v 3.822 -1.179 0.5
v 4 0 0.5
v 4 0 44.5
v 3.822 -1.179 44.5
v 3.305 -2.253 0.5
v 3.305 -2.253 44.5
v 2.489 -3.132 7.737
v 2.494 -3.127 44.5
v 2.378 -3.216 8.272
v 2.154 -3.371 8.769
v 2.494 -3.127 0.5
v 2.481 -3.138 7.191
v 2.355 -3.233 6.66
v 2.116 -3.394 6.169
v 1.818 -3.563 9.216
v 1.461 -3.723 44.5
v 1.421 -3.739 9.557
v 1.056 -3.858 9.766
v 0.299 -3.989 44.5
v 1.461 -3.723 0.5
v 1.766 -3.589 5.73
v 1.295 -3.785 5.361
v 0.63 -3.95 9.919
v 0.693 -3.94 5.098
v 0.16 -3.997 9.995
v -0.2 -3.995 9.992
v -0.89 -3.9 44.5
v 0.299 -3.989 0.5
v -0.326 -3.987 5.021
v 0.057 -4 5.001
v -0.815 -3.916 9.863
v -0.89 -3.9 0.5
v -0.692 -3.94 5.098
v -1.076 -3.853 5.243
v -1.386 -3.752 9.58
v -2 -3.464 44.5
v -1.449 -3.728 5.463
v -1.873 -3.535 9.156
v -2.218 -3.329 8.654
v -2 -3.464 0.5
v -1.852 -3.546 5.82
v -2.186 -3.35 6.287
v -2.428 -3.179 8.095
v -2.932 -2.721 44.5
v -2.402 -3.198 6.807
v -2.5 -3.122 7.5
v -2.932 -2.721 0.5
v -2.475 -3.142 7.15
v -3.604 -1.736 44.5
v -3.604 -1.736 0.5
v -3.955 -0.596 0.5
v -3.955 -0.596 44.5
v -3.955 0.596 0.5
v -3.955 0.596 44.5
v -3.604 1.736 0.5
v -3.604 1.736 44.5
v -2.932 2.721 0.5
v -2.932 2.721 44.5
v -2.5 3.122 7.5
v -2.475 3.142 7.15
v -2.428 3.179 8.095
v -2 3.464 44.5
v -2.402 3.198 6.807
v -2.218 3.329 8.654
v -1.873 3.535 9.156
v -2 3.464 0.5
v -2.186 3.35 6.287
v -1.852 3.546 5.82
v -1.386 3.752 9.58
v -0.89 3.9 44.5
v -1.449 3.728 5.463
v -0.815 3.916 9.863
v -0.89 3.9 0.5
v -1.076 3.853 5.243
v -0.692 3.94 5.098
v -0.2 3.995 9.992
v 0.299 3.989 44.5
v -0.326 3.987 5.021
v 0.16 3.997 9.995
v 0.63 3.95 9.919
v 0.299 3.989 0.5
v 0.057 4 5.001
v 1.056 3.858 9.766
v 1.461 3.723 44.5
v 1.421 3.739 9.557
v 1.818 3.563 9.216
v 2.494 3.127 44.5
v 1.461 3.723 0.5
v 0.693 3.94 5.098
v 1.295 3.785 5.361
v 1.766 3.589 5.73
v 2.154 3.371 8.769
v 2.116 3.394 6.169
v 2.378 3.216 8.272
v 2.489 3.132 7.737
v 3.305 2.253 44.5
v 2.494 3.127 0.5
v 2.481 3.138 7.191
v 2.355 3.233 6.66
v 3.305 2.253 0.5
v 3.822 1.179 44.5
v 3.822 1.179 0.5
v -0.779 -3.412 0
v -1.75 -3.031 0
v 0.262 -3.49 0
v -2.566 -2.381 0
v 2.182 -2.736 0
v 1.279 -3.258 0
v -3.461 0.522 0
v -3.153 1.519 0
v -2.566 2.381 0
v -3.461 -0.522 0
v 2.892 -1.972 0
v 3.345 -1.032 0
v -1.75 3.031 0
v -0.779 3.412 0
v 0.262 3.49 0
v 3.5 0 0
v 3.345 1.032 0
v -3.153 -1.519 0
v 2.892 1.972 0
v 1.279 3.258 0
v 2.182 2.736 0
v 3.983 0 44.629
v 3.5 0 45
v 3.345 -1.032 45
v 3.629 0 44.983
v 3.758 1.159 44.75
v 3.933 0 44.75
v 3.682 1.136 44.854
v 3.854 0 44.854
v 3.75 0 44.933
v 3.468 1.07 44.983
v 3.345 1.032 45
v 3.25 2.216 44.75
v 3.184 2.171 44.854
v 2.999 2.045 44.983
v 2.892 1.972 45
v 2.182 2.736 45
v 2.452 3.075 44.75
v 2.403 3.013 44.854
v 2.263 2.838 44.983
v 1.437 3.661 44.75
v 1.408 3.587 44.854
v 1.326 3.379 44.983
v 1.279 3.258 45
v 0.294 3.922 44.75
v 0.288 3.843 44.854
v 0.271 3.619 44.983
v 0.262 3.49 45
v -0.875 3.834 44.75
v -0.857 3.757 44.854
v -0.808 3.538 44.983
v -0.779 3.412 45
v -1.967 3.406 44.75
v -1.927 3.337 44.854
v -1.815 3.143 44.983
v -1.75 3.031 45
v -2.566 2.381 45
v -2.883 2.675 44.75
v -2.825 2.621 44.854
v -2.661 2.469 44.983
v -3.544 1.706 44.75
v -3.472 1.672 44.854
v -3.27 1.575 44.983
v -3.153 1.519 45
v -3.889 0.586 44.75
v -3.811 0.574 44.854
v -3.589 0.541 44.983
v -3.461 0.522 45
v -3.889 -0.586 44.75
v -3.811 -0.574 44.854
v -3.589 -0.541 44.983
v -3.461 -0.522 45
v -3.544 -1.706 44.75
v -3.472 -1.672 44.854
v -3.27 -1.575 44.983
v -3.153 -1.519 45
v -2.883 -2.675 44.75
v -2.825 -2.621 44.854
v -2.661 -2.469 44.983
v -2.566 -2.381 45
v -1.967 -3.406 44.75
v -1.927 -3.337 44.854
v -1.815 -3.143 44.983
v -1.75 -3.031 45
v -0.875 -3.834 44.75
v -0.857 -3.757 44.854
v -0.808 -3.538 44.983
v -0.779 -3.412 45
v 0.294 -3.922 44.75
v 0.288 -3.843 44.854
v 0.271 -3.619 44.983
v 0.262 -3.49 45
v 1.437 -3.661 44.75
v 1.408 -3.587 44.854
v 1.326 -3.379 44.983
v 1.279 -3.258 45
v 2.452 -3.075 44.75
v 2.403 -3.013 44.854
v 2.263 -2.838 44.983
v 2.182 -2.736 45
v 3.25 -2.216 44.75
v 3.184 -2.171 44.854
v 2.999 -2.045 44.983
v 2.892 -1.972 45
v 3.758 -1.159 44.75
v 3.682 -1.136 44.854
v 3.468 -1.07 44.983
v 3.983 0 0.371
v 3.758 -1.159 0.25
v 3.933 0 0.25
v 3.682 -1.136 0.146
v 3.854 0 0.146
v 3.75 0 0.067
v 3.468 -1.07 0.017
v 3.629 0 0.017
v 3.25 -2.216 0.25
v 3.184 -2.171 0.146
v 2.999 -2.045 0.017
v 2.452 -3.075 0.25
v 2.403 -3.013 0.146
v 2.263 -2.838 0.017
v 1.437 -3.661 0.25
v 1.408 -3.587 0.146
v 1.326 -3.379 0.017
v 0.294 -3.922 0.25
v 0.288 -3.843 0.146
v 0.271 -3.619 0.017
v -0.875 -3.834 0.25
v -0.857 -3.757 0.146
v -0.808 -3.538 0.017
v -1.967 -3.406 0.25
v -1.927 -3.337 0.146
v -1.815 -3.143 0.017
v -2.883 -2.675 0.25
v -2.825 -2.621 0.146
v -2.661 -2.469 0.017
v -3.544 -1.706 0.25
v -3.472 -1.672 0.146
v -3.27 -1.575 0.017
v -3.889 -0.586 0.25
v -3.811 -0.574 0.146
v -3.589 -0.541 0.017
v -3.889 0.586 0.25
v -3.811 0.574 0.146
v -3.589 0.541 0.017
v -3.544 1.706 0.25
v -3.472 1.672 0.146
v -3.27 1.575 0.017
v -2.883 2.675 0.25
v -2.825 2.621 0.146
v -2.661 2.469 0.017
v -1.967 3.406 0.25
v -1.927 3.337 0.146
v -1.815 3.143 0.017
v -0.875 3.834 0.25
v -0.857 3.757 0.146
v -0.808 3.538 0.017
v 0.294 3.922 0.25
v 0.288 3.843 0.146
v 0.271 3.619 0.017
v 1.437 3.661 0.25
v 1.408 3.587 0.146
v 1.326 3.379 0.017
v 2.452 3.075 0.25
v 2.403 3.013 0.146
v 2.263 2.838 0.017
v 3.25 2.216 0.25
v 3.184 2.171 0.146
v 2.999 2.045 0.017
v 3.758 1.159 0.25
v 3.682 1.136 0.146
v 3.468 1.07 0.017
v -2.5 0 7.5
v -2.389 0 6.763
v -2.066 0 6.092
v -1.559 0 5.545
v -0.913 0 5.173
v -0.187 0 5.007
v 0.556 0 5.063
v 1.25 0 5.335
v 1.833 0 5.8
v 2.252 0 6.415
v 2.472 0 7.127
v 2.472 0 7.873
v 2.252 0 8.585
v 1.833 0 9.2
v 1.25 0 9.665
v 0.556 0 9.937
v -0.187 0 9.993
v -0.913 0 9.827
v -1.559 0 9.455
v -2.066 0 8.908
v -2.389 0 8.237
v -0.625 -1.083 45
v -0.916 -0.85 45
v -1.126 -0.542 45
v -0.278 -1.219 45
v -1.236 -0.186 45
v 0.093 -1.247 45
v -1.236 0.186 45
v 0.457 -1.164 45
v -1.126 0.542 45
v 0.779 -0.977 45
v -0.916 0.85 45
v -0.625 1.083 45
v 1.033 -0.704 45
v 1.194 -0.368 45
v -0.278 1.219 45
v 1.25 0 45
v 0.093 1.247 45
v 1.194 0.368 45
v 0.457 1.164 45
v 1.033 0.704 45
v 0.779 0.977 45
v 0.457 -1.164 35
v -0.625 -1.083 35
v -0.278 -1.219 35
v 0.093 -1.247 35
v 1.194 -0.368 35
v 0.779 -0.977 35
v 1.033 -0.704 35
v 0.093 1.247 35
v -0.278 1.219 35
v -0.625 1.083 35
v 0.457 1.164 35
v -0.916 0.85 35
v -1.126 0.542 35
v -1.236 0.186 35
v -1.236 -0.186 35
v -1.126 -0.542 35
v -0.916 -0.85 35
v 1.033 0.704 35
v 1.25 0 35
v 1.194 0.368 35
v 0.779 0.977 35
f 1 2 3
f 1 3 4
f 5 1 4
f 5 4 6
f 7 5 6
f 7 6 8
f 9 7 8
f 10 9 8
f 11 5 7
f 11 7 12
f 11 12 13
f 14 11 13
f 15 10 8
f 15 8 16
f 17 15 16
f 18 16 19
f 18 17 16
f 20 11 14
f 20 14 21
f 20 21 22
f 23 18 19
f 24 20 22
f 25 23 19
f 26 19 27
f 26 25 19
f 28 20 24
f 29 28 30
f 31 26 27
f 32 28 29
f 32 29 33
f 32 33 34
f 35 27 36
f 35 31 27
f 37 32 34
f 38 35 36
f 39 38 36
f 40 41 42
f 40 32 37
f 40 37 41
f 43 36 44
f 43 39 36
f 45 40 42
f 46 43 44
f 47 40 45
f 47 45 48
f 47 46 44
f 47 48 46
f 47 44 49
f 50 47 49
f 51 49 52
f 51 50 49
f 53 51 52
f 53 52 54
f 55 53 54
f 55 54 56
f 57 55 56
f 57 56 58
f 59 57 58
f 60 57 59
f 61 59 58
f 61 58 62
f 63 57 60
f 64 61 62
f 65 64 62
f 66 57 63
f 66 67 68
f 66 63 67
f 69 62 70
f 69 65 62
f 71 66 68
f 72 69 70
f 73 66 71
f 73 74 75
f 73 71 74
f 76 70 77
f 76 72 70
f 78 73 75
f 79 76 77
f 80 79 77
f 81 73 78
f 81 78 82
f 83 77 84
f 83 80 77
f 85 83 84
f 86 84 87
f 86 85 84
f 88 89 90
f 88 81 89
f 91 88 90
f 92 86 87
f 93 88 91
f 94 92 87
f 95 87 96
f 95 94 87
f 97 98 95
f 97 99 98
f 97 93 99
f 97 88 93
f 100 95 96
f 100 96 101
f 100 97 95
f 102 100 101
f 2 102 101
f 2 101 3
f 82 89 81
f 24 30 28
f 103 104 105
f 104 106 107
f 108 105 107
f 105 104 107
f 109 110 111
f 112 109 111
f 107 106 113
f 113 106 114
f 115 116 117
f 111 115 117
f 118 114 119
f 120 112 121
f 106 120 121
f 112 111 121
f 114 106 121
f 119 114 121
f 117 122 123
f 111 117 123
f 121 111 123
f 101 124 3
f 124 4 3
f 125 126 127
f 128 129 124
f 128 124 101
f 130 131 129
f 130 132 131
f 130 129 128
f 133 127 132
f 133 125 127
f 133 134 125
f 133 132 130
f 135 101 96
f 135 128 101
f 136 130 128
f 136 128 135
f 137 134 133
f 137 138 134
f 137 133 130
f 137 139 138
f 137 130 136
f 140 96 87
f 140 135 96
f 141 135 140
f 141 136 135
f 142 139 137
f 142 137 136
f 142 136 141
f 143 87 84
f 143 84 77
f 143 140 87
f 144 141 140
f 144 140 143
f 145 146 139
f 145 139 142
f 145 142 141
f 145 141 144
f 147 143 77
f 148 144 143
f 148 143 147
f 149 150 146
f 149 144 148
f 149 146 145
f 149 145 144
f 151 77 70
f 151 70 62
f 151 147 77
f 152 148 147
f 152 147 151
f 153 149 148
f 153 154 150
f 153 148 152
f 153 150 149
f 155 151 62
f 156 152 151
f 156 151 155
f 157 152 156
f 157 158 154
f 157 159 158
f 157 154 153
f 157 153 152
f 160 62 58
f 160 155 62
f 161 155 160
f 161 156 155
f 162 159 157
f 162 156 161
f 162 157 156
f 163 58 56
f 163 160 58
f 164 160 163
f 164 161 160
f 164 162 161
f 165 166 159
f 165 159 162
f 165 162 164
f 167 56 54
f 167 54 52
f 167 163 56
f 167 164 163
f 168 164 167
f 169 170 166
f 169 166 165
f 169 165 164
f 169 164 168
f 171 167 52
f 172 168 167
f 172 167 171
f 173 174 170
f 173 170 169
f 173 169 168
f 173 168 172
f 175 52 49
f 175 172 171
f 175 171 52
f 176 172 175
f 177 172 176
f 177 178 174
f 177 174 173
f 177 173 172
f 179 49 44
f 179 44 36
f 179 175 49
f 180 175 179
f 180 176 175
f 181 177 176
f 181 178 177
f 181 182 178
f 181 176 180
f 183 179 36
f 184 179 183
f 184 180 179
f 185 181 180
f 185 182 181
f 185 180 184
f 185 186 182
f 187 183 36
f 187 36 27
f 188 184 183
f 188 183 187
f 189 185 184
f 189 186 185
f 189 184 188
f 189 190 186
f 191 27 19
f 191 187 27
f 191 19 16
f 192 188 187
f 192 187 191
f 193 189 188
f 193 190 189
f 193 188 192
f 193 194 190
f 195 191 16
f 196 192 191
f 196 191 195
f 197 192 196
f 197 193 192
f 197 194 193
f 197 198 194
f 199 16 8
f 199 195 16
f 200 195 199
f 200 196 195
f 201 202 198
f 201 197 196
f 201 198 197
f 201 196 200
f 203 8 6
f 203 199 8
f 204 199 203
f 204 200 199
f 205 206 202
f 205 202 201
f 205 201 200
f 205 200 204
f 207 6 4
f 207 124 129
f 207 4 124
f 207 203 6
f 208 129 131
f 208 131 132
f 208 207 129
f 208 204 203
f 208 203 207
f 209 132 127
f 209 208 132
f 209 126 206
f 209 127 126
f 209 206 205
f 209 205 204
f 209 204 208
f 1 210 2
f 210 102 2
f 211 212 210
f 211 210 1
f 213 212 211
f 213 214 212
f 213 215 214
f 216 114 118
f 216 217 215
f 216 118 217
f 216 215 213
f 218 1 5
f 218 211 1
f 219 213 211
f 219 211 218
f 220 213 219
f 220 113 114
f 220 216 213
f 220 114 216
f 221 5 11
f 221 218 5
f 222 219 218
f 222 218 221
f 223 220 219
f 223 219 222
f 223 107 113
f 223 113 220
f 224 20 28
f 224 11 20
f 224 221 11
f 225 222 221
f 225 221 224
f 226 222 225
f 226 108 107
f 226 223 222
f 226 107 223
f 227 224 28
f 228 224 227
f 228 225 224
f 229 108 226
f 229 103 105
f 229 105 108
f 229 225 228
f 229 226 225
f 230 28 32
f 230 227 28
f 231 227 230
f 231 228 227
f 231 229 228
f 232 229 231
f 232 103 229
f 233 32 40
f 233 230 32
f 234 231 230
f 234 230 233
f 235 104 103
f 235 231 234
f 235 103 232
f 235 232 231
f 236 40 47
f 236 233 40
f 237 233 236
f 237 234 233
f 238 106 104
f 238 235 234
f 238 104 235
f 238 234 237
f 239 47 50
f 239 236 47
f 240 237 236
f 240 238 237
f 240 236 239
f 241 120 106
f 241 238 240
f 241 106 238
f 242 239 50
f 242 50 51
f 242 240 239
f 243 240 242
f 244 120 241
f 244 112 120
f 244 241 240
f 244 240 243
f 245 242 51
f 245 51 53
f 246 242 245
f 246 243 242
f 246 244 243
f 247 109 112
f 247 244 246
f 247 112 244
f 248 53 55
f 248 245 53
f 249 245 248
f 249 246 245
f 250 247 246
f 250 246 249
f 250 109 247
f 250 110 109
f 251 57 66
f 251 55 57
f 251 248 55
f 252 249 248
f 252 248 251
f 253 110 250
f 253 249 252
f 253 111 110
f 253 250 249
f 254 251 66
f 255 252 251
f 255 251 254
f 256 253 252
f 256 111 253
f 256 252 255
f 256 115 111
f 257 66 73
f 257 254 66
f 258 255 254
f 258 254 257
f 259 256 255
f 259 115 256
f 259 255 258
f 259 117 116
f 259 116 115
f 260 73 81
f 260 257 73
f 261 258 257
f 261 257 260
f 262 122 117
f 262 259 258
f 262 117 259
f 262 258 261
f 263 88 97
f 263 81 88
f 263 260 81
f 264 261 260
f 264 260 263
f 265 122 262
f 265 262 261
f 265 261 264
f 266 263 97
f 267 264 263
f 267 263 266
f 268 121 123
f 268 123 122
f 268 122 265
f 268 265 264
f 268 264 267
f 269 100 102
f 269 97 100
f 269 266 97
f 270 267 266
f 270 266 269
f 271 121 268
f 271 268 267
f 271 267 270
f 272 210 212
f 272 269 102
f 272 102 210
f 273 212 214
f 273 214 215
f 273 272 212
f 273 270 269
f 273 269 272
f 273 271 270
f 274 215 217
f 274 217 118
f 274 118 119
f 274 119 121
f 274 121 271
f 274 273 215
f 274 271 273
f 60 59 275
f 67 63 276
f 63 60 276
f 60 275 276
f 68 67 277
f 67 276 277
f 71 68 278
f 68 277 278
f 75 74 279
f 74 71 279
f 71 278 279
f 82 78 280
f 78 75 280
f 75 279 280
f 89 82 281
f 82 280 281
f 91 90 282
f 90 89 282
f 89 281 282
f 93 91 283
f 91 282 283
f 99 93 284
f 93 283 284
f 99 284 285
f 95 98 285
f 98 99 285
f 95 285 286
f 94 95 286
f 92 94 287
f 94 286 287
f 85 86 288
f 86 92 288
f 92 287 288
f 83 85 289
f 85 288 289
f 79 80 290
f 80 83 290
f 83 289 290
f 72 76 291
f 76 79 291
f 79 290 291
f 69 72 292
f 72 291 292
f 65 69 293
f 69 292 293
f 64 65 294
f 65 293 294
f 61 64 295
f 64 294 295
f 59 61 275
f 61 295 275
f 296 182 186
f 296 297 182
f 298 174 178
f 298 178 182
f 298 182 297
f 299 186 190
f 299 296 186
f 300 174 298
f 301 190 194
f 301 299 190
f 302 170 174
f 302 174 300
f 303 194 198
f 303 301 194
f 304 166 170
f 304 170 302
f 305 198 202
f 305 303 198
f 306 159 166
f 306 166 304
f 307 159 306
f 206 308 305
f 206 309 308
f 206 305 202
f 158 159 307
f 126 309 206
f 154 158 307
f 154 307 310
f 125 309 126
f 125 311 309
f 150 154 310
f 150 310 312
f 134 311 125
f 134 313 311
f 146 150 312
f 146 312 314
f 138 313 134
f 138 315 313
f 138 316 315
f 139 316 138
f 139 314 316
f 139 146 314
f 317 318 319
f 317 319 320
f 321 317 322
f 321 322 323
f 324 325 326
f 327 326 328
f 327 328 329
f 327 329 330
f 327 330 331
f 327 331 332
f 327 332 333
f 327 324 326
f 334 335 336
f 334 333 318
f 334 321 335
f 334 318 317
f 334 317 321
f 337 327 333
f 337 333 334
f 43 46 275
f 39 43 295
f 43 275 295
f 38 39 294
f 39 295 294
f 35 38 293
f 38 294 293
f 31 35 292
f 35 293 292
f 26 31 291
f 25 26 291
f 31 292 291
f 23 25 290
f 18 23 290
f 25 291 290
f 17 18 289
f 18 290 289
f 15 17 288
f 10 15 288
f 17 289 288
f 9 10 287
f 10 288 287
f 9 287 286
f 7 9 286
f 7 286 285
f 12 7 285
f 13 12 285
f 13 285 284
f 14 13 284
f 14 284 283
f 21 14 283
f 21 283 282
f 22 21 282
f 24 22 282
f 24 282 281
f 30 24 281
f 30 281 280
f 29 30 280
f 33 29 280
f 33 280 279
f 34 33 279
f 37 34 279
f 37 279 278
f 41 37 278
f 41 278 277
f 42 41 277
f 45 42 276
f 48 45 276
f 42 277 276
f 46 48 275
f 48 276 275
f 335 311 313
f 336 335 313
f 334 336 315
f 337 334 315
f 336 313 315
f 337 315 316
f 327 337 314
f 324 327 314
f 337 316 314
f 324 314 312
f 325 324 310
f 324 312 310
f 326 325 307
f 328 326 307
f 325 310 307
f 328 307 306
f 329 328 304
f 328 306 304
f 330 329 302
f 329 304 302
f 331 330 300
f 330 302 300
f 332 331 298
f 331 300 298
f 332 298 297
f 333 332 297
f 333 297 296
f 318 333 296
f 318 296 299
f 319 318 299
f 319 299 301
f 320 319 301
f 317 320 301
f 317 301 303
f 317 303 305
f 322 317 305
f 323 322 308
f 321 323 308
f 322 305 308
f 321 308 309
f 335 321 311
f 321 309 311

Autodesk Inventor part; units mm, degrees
ref_plane "YZ Plane" through (0, 0, 0) normal (1, 0, 0) x (0, 1, 0)
ref_plane "XZ Plane" through (0, 0, 0) normal (0, 1, 0) x (-1, 0, 0)
ref_plane "XY Plane" through (0, 0, 0) normal (0, 0, 1) x (1, 0, 0)
sketch "Sketch1" plane through (0, 0, 0) normal (0, 0, 1) x (1, 0, 0)
  circle A0 centre (0, 0) radius 4
  dimension "d0" = 8
extrude "Extrusion1" add sketch "Sketch1" along normal blind 45
sketch "Sketch2" plane through (0, 0, 45) normal (0, 0, 1) x (1, 0, 0)
  circle A0 centre (0, 0) radius 1.25
  circle A1 centre (0, 0) radius 4 projected
  dimension "d3" = 2.5
extrude "Extrusion2" cut sketch "Sketch2" against normal blind 10 contours A0
sketch "Sketch3" plane through (0, 0, 0) normal (0, 1, 0) x (-1, 0, 0)
  circle A0 centre (0, 7.5) radius 2.5
  line L0 (4, 0) -> (-4, 0) projected
  point P0 (0, 0)
  dimension "d6" = 5
  dimension "d7" = 7.5
extrude "Extrusion3" cut sketch "Sketch3" along normal mid plane 10
thread "Thread1" size "M8x1.25" class "6g" standard "ANSI Metric M Profile" length 30 offset 15
fillet "Fillet1" radius 0.5 1 edges at (-4, 0, 45)
fillet "Fillet2" radius 0.5 1 edges at (-4, 0, 0)
properties part number "Drivescrew"
